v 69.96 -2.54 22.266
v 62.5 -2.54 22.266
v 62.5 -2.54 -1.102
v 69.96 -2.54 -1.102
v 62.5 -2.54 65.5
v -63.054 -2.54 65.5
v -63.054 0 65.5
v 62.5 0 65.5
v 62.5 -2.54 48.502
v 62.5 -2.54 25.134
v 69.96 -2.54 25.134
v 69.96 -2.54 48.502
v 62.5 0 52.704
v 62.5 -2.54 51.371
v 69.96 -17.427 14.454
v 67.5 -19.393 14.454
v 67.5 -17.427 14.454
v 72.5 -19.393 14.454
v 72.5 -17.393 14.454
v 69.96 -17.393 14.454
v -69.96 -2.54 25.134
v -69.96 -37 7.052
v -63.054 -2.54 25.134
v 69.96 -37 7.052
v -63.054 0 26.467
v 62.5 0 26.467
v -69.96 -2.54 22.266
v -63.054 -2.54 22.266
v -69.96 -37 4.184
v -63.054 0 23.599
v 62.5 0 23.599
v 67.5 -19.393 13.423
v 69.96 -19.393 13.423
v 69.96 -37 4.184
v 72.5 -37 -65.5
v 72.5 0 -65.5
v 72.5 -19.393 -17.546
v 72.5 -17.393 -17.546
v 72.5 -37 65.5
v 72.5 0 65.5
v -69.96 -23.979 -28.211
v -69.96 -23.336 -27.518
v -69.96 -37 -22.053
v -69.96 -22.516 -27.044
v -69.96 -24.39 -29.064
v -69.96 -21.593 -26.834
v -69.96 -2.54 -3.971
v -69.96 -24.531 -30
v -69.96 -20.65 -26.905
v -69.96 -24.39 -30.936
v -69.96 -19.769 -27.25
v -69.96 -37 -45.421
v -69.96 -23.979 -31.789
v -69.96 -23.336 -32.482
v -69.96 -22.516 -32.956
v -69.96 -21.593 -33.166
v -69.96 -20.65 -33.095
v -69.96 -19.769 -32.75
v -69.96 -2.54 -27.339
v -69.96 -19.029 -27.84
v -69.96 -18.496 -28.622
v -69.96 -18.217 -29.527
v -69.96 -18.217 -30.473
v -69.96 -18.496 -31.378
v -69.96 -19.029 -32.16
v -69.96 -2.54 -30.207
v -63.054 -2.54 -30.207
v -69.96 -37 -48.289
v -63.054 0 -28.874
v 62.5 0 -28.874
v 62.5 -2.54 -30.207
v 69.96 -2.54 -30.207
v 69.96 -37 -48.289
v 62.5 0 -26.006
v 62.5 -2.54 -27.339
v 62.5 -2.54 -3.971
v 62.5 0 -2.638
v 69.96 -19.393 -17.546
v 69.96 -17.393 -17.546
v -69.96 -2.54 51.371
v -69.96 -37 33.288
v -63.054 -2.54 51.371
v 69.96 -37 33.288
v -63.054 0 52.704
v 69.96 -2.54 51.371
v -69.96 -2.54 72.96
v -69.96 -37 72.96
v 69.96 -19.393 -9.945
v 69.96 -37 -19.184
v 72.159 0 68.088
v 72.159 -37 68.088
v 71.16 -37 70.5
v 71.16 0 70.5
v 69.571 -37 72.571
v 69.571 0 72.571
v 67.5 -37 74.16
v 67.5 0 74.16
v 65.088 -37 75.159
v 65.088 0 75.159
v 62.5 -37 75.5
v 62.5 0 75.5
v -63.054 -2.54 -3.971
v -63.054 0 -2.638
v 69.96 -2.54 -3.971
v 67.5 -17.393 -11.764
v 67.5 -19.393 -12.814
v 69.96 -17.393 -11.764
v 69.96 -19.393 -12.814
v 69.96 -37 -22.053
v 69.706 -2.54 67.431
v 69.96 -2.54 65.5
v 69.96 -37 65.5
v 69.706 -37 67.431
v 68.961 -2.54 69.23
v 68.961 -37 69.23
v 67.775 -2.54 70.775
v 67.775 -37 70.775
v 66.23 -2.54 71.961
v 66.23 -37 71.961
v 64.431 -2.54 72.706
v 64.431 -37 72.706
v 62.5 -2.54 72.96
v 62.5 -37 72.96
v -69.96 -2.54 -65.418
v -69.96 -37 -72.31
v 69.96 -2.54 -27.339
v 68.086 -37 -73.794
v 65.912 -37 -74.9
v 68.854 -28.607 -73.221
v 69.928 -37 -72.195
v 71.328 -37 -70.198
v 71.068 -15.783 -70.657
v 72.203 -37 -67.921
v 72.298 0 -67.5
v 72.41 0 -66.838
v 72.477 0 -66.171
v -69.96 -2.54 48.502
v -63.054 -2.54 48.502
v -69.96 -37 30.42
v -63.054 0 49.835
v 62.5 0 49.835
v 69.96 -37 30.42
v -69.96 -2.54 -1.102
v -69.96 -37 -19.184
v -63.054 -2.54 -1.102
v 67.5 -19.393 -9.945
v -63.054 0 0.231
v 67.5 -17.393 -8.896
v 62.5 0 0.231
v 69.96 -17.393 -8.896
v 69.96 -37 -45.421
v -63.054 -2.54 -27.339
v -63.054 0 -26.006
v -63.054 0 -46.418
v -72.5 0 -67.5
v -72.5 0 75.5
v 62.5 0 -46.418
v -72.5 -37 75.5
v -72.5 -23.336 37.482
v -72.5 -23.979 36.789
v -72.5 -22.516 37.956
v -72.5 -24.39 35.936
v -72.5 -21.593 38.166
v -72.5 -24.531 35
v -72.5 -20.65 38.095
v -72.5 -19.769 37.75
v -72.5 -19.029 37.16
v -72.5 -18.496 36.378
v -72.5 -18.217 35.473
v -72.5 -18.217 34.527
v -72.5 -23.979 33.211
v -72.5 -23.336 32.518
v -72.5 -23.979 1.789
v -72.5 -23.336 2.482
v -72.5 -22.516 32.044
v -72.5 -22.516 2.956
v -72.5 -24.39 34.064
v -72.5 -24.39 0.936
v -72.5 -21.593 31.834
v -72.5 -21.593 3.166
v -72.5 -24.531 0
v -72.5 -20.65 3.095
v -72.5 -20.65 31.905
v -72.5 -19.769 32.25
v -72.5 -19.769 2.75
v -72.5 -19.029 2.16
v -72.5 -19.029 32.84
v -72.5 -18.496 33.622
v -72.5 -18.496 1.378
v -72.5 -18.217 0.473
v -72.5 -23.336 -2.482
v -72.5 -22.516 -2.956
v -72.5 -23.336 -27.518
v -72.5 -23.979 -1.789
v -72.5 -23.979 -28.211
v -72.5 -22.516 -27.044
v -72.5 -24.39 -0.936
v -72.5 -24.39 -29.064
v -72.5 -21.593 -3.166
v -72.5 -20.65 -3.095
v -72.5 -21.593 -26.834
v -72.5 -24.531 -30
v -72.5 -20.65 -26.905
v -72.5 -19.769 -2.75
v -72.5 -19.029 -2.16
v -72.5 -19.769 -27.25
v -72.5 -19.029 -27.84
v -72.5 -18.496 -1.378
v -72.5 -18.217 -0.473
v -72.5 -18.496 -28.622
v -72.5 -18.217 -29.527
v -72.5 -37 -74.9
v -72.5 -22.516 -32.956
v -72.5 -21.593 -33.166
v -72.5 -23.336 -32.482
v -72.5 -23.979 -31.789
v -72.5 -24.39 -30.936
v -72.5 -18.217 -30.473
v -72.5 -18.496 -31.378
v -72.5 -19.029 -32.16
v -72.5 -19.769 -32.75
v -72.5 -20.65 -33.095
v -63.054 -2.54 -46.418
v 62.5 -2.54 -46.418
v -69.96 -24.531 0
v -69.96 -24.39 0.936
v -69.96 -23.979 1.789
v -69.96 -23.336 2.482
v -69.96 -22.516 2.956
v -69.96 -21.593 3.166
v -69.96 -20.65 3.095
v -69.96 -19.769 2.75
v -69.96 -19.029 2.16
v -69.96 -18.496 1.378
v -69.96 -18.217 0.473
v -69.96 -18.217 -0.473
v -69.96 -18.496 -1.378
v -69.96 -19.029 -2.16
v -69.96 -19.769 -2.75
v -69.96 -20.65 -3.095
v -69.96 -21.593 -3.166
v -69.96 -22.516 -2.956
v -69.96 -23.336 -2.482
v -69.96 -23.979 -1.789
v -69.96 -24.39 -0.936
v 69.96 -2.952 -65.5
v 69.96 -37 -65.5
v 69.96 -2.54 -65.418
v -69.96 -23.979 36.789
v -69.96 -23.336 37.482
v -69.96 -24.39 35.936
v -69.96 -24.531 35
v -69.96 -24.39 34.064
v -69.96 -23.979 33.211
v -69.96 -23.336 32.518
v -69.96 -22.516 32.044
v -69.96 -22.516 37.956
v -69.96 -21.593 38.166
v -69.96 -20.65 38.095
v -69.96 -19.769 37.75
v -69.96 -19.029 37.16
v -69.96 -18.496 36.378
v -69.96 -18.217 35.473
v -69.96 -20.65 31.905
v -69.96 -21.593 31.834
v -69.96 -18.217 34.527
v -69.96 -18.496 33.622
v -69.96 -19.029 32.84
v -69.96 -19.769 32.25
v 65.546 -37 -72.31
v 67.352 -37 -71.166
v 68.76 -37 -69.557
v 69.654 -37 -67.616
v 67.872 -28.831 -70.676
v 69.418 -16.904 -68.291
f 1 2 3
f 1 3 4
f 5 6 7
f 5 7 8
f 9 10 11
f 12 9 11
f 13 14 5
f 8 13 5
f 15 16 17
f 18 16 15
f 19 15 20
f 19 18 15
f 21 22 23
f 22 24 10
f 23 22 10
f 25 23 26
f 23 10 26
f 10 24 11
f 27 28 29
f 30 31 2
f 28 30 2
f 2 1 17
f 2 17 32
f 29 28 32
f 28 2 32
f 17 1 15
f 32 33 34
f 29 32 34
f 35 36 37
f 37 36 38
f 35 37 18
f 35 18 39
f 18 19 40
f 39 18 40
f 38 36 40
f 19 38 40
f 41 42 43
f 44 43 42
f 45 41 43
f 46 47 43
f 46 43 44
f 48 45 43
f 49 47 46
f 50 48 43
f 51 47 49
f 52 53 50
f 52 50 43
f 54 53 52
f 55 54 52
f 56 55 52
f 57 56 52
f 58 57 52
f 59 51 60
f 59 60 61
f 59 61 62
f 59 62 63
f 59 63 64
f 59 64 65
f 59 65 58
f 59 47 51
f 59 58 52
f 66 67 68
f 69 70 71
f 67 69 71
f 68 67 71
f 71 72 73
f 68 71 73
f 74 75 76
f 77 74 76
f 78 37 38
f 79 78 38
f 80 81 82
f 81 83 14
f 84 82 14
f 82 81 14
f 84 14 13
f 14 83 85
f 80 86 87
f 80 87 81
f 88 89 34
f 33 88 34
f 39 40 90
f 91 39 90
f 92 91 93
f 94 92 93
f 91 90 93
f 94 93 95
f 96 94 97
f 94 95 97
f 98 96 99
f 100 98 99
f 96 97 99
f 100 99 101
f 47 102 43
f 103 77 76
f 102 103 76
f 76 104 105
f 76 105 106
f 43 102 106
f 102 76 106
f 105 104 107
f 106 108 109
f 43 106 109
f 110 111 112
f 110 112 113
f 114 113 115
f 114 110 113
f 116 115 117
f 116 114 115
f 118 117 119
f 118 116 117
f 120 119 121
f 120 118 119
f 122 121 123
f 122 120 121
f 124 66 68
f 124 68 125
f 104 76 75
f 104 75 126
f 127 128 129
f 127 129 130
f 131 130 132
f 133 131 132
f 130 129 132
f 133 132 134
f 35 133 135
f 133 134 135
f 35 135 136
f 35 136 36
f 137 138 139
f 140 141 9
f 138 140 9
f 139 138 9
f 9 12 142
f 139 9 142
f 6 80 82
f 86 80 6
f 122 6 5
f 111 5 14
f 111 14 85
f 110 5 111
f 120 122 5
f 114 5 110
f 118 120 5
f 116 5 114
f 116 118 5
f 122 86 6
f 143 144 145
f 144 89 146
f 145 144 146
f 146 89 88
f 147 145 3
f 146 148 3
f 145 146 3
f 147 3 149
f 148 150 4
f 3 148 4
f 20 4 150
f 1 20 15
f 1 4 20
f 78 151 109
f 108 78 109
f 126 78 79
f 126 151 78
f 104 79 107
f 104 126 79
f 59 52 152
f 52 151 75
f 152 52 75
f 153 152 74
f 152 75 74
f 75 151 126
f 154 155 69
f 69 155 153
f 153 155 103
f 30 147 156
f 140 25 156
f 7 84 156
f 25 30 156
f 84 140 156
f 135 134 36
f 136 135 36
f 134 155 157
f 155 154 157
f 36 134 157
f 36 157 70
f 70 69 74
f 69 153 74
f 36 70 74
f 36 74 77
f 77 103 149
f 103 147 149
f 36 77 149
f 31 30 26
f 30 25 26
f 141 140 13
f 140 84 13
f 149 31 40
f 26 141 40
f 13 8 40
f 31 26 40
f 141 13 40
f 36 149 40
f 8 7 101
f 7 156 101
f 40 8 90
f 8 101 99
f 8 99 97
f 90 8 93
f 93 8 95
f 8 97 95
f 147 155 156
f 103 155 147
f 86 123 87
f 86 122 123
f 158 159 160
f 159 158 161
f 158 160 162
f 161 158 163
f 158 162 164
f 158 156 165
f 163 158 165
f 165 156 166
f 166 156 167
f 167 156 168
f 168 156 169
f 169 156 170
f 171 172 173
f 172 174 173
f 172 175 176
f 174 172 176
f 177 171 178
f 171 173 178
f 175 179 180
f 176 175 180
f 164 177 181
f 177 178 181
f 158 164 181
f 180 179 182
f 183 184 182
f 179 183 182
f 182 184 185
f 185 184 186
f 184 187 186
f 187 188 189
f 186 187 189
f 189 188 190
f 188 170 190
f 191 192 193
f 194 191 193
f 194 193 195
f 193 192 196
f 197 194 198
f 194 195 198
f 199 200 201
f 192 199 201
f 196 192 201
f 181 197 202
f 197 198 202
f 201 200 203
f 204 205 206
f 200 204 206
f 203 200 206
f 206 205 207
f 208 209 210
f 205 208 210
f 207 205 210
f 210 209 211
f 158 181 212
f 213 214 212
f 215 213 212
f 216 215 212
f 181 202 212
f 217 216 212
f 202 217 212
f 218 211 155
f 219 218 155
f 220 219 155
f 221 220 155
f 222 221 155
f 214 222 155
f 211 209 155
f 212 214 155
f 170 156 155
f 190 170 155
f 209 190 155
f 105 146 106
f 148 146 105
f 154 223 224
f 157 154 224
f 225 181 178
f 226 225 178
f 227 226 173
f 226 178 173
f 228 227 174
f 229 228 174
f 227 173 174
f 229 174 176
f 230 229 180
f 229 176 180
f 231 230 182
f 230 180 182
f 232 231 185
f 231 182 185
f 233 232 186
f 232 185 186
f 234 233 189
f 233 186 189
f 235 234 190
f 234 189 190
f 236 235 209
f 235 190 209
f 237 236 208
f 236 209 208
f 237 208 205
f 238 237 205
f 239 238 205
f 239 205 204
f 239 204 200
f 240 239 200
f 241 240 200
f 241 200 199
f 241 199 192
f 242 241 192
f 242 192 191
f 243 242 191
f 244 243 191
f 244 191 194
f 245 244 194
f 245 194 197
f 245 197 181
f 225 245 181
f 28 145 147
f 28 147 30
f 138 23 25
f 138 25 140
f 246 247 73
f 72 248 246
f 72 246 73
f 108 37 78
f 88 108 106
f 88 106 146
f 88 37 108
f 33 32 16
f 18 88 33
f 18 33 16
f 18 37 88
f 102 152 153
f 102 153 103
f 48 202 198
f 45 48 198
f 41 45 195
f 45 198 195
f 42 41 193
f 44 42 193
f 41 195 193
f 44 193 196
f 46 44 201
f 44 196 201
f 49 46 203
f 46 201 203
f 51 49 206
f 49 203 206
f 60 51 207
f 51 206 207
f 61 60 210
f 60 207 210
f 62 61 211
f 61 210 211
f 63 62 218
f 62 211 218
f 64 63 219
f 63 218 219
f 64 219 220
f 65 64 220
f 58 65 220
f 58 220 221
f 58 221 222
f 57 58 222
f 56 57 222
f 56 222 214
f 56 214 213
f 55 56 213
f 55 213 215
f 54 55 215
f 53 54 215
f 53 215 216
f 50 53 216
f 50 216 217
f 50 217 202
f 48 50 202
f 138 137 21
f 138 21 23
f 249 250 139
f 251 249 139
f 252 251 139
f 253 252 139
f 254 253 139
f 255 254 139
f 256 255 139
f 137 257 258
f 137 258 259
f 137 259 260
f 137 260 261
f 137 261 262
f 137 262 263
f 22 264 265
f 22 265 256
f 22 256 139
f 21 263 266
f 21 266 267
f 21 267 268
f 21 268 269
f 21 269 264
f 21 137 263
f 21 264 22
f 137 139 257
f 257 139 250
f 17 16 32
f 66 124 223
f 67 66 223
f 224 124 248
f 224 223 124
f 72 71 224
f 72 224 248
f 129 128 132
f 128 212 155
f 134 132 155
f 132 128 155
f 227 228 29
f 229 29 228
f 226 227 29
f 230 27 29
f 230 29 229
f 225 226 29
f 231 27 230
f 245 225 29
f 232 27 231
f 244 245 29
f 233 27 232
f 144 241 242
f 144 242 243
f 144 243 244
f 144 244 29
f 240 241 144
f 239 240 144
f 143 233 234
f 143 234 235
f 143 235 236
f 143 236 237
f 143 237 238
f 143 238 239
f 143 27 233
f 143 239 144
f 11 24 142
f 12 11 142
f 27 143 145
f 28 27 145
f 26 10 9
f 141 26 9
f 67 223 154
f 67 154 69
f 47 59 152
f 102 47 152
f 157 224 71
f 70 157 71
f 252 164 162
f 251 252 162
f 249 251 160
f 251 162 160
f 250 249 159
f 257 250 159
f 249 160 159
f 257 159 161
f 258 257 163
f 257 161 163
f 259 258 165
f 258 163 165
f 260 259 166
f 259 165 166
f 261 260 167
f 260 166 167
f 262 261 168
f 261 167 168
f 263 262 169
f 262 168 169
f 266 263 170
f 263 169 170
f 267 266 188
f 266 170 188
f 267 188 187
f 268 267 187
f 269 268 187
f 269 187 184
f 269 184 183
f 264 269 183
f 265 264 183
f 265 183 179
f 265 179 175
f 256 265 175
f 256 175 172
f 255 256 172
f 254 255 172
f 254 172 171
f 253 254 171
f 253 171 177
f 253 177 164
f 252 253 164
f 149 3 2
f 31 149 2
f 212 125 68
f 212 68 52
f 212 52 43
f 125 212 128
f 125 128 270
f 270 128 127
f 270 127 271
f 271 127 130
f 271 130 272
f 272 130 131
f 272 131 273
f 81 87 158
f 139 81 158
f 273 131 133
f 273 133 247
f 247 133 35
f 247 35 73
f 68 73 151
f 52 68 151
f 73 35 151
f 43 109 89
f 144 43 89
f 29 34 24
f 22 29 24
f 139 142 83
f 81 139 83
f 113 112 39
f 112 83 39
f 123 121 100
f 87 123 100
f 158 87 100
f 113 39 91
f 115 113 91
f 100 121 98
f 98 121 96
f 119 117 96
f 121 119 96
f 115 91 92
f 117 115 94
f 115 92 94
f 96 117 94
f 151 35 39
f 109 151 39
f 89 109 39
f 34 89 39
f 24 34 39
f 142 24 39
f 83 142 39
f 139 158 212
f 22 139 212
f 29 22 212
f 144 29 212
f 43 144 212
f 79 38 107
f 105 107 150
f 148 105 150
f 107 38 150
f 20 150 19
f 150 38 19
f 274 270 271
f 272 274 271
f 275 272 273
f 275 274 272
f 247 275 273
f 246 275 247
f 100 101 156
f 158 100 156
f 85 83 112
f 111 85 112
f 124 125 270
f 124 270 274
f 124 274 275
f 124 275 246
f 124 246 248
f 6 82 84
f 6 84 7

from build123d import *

# Parameters (mm, degrees)
F1_DEPTH    = 37
F2_T1_DEPTH = 342.8505669038
F3_T        = -2.54
F4_W        = 125.55387271
F4_H        = 111.9176980871
F5_DEPTH    = 25.4
F6_R        = 3.175
F7_DEPTH    = 19.05
F9_DEPTH    = 142.24
F10_W       = 2
F10_H       = 32
F11_DEPTH   = 5


# Not quite as in the source:
# - a fillet or chamfer that OpenCascade refuses, or shapes differently, is made with other operations: its cross-section is extruded or revolved along the edge and cut away or added


with BuildPart() as f1:
    # F0 (on Front) → F1 (new body)
    with BuildSketch(Plane.XZ):
        with BuildLine():
            Line((62.5, 75.5), (-72.5, 75.5))
            Line((-72.5, 75.5), (-72.5, -75.5))
            Line((-72.5, -75.5), (62.5, -75.5))
            ThreePointArc((62.5, -75.5), (69.5710678119, -72.5710678119), (72.5, -65.5))
            Line((72.5, -65.5), (72.5, 65.5))
            ThreePointArc((72.5, 65.5), (69.5710678119, 72.5710678119), (62.5, 75.5))
        make_face()
    extrude(amount=F1_DEPTH)

    # F2: chamfer of 40 x 8 on 1 edges, made by hand

    # F2_s2 → F2_t1 (cut)
    with BuildSketch(Plane.YZ.offset(-176.4252834519)):
        Polygon((-40, -75.5), (0, -67.5), (0, -75.5), align=None)
    extrude(amount=F2_T1_DEPTH, mode=Mode.SUBTRACT)

    # F3
    f3_openings = [f1.faces().sort_by_distance(p)[0] for p in [
        (-0.123954, -37, 0.284541),
    ]]
    offset(amount=F3_T, openings=f3_openings)

    # F4 (on face) → F5 (cut)
    with BuildSketch(Plane.XZ.offset(2.54)):
        with Locations((-0.276936355, 9.5411509565)):
            Rectangle(F4_W, F4_H)
    extrude(amount=-F5_DEPTH, mode=Mode.SUBTRACT)

    # F6 (on face) → F7 (cut)
    with BuildSketch(Plane(origin=(-72.5, 0, 0), x_dir=(0, -1, 0), z_dir=(-1, 0, 0))):
        with Locations((21.3561020792, 0)):
            Circle(F6_R)
        with Locations((21.3561020792, 35)):
            Circle(F6_R)
        with Locations((21.3561020792, -30)):
            Circle(F6_R)
    extrude(amount=-F7_DEPTH, mode=Mode.SUBTRACT)

    # F8 (on face) → F9 (join)
    with BuildSketch(Plane(origin=(69.96, 0, 0), x_dir=(0, -1, 0), z_dir=(-1, 0, 0))):
        Polygon((0, -28.8742875891), (37, -48.2893098931), (37, -45.4208615419), (0, -26.005839238), align=None)
        Polygon((0, -2.637839238), (37, -22.0528615419), (37, -19.1844131908), (0, 0.2306091132), align=None)
        Polygon((0, 23.5986091132), (37, 4.1835868092), (37, 7.0520351604), (0, 26.4670574643), align=None)
        Polygon((0, 49.8350574643), (37, 30.4200351604), (37, 33.2884835115), (0, 52.7035058155), align=None)
    extrude(amount=F9_DEPTH)

    # F10 (on face) → F11 (cut)
    with BuildSketch(Plane.YZ.offset(72.5)):
        with Locations((-18.3929149747, -1.5458973408)):
            Rectangle(F10_W, F10_H)
    extrude(amount=-F11_DEPTH, mode=Mode.SUBTRACT)


solid = f1.part
